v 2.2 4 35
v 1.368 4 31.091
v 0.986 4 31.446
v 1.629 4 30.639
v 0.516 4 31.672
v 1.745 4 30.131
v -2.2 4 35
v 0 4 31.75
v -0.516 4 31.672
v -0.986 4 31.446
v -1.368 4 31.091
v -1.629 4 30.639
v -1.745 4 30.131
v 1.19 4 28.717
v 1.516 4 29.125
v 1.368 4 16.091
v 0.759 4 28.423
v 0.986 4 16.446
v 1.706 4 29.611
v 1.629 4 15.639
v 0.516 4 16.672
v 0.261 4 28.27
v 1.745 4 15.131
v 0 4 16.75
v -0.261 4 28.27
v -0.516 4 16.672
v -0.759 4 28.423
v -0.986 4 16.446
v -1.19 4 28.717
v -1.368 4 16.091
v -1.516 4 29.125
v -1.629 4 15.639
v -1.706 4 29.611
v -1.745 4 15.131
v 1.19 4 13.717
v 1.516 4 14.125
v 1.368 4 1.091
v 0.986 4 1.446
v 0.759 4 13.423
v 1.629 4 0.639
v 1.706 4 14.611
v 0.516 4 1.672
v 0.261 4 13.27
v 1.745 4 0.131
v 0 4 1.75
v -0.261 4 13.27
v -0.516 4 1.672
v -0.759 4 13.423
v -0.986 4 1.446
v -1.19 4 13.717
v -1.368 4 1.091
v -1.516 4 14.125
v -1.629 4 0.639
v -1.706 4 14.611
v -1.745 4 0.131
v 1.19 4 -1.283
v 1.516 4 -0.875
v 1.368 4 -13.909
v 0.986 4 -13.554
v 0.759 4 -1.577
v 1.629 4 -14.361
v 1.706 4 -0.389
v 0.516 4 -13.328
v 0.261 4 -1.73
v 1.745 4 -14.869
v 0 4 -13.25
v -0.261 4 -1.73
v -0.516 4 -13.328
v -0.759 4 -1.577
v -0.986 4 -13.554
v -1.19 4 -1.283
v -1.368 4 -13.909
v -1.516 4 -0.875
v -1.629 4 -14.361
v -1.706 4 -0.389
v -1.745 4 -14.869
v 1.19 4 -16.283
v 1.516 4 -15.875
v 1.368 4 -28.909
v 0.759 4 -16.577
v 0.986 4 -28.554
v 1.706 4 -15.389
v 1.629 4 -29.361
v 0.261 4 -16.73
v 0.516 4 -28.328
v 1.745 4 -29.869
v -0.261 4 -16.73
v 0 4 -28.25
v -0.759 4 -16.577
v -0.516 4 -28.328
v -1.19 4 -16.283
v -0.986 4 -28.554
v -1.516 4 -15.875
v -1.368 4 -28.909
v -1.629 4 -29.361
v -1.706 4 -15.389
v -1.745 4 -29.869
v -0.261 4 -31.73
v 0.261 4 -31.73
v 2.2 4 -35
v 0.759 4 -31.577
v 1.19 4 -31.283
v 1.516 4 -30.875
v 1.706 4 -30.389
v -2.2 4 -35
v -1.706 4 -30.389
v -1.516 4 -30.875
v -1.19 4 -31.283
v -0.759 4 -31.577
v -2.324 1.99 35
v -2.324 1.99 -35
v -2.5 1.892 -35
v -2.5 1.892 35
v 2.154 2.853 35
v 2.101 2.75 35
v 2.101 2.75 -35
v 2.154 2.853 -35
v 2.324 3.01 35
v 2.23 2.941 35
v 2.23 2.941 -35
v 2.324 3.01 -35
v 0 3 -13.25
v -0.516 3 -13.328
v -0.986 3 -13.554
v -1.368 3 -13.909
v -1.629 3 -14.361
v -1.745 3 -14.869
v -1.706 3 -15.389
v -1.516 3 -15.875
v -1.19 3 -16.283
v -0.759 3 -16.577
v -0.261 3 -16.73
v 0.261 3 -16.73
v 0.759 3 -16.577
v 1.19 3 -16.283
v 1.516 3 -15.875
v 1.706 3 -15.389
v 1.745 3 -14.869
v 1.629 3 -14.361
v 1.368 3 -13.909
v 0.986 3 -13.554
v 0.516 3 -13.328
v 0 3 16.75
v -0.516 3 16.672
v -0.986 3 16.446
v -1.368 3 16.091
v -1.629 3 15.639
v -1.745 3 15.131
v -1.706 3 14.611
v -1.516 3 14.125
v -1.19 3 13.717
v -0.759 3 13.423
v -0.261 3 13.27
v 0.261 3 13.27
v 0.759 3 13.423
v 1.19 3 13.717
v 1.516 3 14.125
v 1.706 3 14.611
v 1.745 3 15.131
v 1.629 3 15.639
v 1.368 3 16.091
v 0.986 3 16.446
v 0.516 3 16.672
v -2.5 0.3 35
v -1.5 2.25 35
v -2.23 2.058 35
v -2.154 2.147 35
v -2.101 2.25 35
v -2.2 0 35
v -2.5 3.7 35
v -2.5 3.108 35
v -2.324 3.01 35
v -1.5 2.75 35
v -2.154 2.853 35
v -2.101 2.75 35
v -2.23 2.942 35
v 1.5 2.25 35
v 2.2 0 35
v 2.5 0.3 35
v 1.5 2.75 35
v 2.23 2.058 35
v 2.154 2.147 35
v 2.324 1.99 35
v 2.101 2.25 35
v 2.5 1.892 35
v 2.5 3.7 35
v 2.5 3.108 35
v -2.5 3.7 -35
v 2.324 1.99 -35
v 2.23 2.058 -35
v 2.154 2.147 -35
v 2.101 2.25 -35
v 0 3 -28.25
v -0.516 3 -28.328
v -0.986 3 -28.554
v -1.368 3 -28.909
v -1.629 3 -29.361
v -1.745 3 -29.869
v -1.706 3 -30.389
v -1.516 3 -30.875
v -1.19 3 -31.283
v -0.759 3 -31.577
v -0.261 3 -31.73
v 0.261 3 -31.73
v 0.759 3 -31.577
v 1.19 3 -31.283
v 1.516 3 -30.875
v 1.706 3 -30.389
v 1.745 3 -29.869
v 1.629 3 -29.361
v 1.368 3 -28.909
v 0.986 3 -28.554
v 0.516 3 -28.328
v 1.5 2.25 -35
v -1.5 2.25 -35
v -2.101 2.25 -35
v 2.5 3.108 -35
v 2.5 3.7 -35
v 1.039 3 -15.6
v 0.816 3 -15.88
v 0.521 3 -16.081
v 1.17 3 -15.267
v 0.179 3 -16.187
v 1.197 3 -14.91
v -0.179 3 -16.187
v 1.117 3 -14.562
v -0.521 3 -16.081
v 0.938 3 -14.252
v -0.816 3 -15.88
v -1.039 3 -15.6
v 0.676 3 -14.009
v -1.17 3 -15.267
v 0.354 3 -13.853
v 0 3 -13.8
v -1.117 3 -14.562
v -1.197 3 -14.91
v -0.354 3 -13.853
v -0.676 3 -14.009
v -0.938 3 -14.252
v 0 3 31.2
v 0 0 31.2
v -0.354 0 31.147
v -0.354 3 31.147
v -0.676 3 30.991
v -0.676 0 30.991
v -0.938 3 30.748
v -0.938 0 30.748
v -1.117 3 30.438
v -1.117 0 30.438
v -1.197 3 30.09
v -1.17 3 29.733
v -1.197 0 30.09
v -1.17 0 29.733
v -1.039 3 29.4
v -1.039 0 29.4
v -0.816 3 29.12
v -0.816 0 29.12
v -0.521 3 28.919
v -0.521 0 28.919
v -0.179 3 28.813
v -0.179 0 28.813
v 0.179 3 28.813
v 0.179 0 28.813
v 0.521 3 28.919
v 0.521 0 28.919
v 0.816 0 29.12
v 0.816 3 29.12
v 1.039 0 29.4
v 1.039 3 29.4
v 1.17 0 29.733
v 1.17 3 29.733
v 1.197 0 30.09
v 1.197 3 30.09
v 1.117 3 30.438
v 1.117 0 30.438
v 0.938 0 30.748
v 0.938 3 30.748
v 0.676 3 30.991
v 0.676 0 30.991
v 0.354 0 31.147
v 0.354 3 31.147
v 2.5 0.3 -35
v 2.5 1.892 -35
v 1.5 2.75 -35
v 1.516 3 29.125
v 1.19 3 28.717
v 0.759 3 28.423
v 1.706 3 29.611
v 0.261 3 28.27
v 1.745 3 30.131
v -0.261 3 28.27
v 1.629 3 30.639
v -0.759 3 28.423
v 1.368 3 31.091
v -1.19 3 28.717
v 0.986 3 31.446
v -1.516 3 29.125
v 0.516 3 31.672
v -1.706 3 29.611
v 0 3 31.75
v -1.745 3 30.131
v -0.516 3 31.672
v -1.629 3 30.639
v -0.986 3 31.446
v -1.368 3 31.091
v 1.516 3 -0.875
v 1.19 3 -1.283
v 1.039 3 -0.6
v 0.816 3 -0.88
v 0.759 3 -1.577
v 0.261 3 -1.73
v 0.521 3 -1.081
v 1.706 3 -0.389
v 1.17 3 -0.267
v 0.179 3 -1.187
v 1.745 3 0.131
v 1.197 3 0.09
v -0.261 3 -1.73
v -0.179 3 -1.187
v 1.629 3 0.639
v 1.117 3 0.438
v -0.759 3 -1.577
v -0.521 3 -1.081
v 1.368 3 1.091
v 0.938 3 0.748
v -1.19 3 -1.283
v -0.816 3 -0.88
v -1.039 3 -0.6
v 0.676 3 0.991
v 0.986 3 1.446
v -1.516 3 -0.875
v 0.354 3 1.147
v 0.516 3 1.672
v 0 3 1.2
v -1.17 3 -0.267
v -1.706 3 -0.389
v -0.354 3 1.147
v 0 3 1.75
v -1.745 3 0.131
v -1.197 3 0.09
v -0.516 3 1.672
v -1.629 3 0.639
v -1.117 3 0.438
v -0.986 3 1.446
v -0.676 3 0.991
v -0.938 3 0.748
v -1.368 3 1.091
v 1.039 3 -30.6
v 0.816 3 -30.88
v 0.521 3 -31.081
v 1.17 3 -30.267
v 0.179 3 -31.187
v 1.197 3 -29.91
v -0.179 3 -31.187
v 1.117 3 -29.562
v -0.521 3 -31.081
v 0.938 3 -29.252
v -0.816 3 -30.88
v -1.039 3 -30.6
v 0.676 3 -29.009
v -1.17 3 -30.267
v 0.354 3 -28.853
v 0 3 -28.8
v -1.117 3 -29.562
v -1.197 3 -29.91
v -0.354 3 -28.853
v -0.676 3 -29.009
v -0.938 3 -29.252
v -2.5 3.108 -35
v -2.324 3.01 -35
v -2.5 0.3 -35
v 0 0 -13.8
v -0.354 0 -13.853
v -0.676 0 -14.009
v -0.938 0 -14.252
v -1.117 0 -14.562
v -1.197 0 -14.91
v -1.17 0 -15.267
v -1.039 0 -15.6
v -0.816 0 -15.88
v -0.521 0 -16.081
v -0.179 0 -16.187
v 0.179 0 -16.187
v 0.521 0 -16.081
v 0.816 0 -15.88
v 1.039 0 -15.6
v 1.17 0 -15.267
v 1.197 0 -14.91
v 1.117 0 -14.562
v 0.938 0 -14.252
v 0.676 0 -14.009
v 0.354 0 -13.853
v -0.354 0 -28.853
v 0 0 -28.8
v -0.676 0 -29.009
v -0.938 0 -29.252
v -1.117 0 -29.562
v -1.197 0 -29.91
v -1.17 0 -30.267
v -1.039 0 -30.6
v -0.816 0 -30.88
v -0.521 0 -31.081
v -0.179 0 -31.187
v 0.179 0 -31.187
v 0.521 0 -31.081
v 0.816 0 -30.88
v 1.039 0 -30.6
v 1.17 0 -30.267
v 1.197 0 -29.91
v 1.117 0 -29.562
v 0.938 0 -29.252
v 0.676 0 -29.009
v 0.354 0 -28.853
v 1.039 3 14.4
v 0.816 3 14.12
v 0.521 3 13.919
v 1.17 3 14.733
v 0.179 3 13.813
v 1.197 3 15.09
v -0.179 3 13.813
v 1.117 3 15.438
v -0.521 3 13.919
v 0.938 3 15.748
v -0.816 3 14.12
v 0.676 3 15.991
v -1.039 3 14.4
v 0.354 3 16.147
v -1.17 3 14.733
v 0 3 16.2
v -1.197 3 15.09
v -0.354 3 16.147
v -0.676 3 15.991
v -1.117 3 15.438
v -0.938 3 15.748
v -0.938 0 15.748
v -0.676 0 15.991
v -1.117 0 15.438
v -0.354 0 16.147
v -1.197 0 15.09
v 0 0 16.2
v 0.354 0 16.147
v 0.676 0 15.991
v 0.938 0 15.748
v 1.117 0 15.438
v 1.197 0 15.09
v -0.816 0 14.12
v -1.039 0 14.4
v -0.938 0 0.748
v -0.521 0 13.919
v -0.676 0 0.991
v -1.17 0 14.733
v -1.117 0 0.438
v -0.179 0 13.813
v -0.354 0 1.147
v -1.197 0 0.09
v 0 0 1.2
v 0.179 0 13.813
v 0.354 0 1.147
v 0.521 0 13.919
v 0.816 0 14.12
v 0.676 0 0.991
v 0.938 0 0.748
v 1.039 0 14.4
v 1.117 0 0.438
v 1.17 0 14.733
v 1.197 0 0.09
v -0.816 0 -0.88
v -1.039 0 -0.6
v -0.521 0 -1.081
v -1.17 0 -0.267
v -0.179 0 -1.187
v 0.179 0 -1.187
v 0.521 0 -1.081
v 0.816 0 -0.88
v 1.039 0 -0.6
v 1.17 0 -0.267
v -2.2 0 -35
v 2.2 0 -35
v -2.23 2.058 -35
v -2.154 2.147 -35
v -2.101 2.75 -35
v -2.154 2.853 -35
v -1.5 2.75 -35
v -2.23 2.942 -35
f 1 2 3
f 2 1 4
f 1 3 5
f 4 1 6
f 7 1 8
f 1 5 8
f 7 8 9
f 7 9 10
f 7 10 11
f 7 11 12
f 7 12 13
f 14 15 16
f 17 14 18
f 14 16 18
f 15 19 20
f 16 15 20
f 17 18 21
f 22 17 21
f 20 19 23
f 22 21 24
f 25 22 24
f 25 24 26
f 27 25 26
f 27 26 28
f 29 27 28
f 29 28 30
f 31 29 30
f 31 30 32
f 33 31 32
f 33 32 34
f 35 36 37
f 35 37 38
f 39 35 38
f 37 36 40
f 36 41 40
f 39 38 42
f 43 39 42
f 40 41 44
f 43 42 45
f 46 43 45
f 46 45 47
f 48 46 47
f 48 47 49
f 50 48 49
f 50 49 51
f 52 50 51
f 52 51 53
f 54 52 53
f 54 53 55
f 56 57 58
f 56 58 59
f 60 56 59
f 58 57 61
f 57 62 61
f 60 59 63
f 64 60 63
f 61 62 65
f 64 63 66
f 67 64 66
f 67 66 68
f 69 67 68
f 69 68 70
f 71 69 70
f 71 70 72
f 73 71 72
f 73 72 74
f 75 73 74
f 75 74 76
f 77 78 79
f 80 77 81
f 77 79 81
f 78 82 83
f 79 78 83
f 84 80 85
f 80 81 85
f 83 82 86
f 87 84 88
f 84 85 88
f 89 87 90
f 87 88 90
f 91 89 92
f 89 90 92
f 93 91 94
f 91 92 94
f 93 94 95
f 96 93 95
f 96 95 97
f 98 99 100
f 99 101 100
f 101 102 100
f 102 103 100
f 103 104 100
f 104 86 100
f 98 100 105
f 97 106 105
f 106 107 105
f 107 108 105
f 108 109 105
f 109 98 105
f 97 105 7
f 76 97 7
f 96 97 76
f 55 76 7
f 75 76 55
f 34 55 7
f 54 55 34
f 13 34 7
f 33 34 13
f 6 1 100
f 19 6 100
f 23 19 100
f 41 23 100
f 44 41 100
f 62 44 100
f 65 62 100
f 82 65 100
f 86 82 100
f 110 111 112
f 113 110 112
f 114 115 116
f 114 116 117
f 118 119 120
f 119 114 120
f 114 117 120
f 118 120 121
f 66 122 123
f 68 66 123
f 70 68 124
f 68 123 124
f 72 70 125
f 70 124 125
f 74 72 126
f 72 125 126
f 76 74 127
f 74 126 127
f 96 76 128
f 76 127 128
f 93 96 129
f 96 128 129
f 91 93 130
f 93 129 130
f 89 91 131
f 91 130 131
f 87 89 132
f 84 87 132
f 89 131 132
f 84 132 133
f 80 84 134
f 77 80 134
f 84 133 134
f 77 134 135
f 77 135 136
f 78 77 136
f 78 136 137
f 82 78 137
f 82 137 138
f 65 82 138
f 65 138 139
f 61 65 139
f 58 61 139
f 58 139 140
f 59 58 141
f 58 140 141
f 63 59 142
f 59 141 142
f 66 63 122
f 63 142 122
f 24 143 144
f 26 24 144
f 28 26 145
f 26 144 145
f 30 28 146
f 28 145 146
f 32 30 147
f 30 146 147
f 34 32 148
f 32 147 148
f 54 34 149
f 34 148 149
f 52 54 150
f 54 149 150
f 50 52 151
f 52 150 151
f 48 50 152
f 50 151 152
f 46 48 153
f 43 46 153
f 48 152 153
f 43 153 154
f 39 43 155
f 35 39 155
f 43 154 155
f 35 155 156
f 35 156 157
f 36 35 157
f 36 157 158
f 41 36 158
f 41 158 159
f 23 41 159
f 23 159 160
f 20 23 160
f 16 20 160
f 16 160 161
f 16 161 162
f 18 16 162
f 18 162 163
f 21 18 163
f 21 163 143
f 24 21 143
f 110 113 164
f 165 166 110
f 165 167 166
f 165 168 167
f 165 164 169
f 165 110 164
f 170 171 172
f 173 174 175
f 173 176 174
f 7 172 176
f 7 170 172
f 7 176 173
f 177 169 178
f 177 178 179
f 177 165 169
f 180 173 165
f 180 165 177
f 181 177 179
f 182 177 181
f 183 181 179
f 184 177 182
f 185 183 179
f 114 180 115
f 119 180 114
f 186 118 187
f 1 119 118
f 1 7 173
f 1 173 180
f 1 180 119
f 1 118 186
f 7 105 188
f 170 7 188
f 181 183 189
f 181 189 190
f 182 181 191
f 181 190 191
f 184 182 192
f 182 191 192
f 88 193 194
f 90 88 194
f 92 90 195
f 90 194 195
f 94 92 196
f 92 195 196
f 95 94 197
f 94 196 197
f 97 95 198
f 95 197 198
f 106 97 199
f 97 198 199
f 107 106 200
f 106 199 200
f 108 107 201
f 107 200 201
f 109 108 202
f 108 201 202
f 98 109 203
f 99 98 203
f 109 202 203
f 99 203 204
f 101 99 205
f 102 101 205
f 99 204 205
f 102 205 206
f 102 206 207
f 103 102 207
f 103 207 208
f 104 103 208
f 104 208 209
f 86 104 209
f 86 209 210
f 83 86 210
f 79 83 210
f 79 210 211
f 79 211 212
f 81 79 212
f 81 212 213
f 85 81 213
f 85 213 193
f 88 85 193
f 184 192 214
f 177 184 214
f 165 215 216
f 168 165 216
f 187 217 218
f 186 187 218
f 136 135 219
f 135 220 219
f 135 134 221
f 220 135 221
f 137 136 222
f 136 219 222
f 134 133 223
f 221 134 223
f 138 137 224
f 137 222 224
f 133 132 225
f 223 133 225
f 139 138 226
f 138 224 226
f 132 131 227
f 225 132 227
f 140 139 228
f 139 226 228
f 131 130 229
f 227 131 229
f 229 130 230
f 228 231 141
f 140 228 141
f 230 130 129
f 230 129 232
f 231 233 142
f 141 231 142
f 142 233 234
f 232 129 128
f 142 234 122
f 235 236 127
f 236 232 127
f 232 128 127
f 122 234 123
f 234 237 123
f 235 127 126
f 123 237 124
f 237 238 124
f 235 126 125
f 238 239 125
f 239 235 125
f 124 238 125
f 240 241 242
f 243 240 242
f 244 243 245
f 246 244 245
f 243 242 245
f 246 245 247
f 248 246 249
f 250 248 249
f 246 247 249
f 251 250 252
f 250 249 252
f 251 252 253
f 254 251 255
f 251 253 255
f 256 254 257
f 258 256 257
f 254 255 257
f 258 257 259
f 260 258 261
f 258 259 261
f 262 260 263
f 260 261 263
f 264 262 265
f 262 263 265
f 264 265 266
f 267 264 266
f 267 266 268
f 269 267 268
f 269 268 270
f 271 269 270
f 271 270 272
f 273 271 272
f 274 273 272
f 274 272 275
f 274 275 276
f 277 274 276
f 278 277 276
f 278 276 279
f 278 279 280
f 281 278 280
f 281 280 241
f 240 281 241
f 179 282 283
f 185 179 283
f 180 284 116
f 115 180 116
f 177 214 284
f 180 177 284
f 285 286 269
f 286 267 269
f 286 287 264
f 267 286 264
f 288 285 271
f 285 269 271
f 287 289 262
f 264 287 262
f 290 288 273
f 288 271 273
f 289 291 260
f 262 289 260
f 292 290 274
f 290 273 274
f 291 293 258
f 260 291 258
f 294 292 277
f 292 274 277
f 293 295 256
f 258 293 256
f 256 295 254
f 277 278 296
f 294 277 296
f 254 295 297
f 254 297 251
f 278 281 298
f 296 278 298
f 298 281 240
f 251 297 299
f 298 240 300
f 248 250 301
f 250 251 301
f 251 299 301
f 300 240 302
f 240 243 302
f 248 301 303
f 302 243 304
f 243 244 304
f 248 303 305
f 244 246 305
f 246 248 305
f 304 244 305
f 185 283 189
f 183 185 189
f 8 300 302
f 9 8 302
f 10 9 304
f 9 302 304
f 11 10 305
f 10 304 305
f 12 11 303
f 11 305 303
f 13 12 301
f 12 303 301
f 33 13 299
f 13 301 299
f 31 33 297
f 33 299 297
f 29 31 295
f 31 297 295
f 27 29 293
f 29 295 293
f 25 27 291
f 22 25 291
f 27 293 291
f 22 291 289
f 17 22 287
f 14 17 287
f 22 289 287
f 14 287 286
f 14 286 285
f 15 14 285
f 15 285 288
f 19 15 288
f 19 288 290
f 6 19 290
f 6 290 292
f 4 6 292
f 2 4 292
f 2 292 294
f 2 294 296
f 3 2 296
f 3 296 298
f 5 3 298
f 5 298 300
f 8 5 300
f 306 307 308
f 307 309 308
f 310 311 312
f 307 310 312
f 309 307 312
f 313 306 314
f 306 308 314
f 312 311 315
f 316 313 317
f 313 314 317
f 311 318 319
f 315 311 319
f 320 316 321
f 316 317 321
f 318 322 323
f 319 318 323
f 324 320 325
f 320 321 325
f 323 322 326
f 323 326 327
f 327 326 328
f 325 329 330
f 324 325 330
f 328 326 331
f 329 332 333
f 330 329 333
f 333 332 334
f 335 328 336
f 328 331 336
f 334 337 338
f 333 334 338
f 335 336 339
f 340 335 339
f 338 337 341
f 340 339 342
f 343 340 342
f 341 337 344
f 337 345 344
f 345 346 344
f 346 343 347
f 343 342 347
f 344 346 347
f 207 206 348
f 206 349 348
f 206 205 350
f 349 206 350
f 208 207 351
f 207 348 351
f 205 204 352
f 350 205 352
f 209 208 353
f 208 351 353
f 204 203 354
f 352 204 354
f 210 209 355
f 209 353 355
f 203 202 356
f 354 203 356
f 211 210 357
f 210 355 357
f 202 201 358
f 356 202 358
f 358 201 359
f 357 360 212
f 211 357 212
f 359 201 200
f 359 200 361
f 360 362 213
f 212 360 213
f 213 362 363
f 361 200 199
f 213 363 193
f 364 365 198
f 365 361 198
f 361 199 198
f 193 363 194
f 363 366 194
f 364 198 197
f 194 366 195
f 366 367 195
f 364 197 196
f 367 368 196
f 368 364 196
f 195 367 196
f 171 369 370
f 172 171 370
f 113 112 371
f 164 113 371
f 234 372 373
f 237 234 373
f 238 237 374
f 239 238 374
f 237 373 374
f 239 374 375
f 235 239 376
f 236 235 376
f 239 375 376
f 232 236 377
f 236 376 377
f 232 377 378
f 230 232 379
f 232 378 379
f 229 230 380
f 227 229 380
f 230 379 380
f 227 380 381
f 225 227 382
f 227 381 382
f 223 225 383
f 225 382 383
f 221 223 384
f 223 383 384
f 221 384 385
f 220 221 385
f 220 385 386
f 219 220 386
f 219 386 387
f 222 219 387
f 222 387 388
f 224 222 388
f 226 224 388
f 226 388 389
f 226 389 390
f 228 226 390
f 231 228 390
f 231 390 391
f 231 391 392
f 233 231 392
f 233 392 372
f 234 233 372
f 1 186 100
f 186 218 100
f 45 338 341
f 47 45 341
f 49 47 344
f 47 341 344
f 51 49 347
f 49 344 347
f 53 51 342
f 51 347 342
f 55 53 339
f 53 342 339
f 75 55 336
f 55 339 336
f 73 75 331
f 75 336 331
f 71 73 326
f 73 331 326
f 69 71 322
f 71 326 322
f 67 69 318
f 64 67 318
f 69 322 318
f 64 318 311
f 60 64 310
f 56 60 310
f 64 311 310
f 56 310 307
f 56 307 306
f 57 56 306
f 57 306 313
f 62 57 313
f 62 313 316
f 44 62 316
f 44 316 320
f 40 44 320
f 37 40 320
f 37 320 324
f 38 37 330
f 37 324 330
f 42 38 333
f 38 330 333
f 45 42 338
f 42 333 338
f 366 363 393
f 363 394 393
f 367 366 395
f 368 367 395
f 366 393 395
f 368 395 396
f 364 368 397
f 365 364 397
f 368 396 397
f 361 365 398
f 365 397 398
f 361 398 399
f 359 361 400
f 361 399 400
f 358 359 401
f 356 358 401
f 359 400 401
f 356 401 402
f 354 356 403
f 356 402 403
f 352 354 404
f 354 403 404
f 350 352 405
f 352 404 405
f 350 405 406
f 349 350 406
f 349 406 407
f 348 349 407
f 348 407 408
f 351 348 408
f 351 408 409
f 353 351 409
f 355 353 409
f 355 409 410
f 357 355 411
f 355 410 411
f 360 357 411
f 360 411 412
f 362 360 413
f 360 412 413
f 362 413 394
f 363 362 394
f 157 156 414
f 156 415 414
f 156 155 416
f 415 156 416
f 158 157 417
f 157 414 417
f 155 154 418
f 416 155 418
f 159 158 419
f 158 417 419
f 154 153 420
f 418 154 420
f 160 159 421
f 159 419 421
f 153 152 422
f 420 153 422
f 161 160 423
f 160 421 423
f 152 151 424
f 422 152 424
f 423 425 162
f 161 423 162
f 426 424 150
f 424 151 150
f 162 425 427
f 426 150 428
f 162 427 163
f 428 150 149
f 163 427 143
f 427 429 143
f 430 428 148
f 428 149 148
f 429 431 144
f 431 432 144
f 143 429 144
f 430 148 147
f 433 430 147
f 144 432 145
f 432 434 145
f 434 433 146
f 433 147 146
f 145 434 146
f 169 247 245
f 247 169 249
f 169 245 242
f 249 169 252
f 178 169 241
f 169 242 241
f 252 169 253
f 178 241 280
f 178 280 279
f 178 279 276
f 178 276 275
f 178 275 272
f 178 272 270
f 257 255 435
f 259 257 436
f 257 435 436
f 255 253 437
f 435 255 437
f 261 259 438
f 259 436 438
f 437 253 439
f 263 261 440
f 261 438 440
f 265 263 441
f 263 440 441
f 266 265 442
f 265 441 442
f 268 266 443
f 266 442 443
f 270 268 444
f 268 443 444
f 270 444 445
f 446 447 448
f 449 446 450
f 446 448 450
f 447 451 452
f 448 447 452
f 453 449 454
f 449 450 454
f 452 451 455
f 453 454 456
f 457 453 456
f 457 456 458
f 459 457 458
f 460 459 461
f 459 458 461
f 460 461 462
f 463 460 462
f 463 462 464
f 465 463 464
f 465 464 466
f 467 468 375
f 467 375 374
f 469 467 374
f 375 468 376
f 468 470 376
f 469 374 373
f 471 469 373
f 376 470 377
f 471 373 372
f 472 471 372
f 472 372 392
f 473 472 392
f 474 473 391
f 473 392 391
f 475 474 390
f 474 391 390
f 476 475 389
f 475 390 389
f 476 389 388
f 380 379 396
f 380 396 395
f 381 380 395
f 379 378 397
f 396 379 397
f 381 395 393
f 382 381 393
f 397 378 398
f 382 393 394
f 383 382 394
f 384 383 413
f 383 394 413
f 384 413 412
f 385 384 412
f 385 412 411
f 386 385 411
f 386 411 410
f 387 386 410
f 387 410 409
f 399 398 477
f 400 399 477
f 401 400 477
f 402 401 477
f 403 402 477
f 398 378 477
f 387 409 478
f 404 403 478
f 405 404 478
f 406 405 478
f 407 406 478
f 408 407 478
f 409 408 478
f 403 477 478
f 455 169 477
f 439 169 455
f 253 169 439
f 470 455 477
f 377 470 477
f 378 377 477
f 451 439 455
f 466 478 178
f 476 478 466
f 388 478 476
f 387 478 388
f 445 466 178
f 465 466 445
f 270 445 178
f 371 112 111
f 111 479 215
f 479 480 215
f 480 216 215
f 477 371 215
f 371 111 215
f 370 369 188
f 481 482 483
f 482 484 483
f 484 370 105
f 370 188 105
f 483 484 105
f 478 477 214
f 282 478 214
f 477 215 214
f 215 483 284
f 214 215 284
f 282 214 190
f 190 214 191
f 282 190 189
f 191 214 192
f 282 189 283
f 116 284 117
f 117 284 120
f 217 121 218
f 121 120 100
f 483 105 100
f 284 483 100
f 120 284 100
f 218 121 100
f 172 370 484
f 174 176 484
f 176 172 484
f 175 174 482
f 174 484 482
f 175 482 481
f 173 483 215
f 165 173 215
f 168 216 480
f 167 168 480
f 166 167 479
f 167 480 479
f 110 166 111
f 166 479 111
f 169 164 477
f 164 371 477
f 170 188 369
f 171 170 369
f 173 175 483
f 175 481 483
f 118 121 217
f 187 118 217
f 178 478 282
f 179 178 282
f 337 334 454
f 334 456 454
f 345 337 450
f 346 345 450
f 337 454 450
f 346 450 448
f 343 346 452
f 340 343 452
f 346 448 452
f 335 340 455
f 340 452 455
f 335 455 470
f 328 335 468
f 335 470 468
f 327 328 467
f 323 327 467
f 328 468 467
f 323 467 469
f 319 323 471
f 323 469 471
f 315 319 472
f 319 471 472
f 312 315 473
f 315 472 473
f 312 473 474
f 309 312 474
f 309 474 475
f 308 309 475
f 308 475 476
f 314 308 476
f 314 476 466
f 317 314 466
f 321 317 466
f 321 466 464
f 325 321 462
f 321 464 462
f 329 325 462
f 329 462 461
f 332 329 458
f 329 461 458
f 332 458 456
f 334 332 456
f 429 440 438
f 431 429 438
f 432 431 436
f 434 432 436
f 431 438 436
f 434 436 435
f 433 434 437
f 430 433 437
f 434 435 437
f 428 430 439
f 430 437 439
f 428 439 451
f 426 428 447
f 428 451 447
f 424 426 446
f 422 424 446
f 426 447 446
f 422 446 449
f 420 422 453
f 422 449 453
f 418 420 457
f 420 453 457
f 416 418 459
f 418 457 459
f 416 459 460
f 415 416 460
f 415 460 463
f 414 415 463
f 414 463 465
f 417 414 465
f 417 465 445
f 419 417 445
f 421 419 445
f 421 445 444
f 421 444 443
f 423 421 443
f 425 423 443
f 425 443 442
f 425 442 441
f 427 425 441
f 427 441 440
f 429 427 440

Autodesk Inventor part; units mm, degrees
sketch "Sketch_12" plane through (0, 0, 0) normal (0, 0, 1) x (1, 0, 0)
  line L0 (-2.5, 3.7) -> (-2.5, 3.1084)
  line L1 (-2.5, 3.1084) -> (-2.3242, 3.0098)
  arc A0 (-2.1007, 2.75) -> (-2.3242, 3.0098) centre (-2.5686, 2.5736) ccw
  line L2 (-2.1007, 2.75) -> (-1.5, 2.75)
  line L3 (-1.5, 2.75) -> (-1.5, 2.25)
  line L4 (-1.5, 2.25) -> (-2.1007, 2.25)
  arc A1 (-2.3242, 1.9902) -> (-2.1007, 2.25) centre (-2.5686, 2.4264) ccw
  line L5 (-2.3242, 1.9902) -> (-2.5, 1.8917)
  line L6 (-2.5, 1.8917) -> (-2.5, 0.3)
  line L7 (-2.5, 0.3) -> (-2.2, 0)
  line L8 (-2.2, 0) -> (2.2, 0)
  line L9 (2.2, 0) -> (2.5, 0.3)
  line L10 (2.5, 0.3) -> (2.5, 1.8917)
  line L11 (2.5, 1.8917) -> (2.3242, 1.9902)
  arc A2 (2.1007, 2.25) -> (2.3242, 1.9902) centre (2.5686, 2.4263) ccw
  line L12 (2.1007, 2.25) -> (1.5, 2.25)
  line L13 (1.5, 2.25) -> (1.5, 2.75)
  line L14 (1.5, 2.75) -> (2.1007, 2.75)
  arc A3 (2.3242, 3.0098) -> (2.1007, 2.75) centre (2.5686, 2.5737) ccw
  line L15 (2.3242, 3.0098) -> (2.5, 3.1084)
  line L16 (2.5, 3.1084) -> (2.5, 3.7)
  line L17 (2.5, 3.7) -> (2.2, 4)
  line L18 (2.2, 4) -> (-2.2, 4)
  line L19 (-2.2, 4) -> (-2.5, 3.7)
extrude "Extrusion1" add sketch "Sketch_12" along normal mid plane 70
sketch "Sketch2" plane through (-2.2, 4, 35) normal (0, 1, 0) x (1, 0, 0)
  point P0 (2.2, 65)
hole "Hole1" at (0, 4, -30) direction (0, -1, 0) diameter 2.4 depth 4 counterbore diameter 3.5 counterbore depth 1
pattern_linear "Rectangular Pattern1" count 5 spacing 15 along (0, 0, 1) of "Hole1"
ref_plane "rail_to_adjusting_block_XY" through (0, 0, -30) normal (0, 1, 0) x (1, 0, 0)
ref_plane "rail_to_adjusting_block_YZ" through (0, 0, -30) normal (1, 0, 0) x (0, 0, -1)
ref_plane "rail_to_adjusting_block_ZX" through (0, 0, -30) normal (0, 0, -1) x (0, 1, 0)
ref_plane "screw_1_XY" through (0, 3, 30) normal (0, -1, 0) x (1, 0, 0)
ref_plane "screw_1_YZ" through (0, 3, 30) normal (1, 0, 0) x (0, 0, 1)
ref_plane "screw_1_ZX" through (0, 3, 30) normal (0, 0, 1) x (0, -1, 0)
ref_plane "screw_2_XY" through (0, 3, 15) normal (0, -1, 0) x (1, 0, 0)
ref_plane "screw_2_YZ" through (0, 3, 15) normal (1, 0, 0) x (0, 0, 1)
ref_plane "screw_2_ZX" through (0, 3, 15) normal (0, 0, 1) x (0, -1, 0)
ref_plane "screw_3_XY" through (0, 3, 0) normal (0, -1, 0) x (1, 0, 0)
ref_plane "screw_3_YZ" through (0, 3, 0) normal (1, 0, 0) x (0, 0, 1)
ref_plane "screw_3_ZX" through (0, 3, 0) normal (0, 0, 1) x (0, -1, 0)
ref_plane "screw_4_XY" through (0, 3, -15) normal (0, -1, 0) x (1, 0, 0)
ref_plane "screw_4_YZ" through (0, 3, -15) normal (1, 0, 0) x (0, 0, 1)
ref_plane "screw_4_ZX" through (0, 3, -15) normal (0, 0, 1) x (0, -1, 0)
ref_plane "screw_5_XY" through (0, 3, -30) normal (0, -1, 0) x (1, 0, 0)
ref_plane "screw_5_YZ" through (0, 3, -30) normal (1, 0, 0) x (0, 0, 1)
ref_plane "screw_5_ZX" through (0, 3, -30) normal (0, 0, 1) x (0, -1, 0)
ref_plane "to_block_XY" through (0, 4, 17.5) normal (0, 0, 1) x (1, 0, 0)
ref_plane "to_block_YZ" through (0, 4, 17.5) normal (1, 0, 0) x (0, 1, 0)
ref_plane "to_block_ZX" through (0, 4, 17.5) normal (0, 1, 0) x (0, 0, 1)
ref_plane "to_block_2_XY" through (0, 4, -17.5) normal (0, 0, 1) x (1, 0, 0)
ref_plane "to_block_2_YZ" through (0, 4, -17.5) normal (1, 0, 0) x (0, 1, 0)
ref_plane "to_block_2_ZX" through (0, 4, -17.5) normal (0, 1, 0) x (0, 0, 1)
ref_plane "to_kue_XY" through (0, 0, 0) normal (0, 1, 0) x (1, 0, 0)
ref_plane "to_kue_YZ" through (0, 0, 0) normal (1, 0, 0) x (0, 0, -1)
ref_plane "to_kue_ZX" through (0, 0, 0) normal (0, 0, -1) x (0, 1, 0)
properties part number "SSE2B6-70_r"
